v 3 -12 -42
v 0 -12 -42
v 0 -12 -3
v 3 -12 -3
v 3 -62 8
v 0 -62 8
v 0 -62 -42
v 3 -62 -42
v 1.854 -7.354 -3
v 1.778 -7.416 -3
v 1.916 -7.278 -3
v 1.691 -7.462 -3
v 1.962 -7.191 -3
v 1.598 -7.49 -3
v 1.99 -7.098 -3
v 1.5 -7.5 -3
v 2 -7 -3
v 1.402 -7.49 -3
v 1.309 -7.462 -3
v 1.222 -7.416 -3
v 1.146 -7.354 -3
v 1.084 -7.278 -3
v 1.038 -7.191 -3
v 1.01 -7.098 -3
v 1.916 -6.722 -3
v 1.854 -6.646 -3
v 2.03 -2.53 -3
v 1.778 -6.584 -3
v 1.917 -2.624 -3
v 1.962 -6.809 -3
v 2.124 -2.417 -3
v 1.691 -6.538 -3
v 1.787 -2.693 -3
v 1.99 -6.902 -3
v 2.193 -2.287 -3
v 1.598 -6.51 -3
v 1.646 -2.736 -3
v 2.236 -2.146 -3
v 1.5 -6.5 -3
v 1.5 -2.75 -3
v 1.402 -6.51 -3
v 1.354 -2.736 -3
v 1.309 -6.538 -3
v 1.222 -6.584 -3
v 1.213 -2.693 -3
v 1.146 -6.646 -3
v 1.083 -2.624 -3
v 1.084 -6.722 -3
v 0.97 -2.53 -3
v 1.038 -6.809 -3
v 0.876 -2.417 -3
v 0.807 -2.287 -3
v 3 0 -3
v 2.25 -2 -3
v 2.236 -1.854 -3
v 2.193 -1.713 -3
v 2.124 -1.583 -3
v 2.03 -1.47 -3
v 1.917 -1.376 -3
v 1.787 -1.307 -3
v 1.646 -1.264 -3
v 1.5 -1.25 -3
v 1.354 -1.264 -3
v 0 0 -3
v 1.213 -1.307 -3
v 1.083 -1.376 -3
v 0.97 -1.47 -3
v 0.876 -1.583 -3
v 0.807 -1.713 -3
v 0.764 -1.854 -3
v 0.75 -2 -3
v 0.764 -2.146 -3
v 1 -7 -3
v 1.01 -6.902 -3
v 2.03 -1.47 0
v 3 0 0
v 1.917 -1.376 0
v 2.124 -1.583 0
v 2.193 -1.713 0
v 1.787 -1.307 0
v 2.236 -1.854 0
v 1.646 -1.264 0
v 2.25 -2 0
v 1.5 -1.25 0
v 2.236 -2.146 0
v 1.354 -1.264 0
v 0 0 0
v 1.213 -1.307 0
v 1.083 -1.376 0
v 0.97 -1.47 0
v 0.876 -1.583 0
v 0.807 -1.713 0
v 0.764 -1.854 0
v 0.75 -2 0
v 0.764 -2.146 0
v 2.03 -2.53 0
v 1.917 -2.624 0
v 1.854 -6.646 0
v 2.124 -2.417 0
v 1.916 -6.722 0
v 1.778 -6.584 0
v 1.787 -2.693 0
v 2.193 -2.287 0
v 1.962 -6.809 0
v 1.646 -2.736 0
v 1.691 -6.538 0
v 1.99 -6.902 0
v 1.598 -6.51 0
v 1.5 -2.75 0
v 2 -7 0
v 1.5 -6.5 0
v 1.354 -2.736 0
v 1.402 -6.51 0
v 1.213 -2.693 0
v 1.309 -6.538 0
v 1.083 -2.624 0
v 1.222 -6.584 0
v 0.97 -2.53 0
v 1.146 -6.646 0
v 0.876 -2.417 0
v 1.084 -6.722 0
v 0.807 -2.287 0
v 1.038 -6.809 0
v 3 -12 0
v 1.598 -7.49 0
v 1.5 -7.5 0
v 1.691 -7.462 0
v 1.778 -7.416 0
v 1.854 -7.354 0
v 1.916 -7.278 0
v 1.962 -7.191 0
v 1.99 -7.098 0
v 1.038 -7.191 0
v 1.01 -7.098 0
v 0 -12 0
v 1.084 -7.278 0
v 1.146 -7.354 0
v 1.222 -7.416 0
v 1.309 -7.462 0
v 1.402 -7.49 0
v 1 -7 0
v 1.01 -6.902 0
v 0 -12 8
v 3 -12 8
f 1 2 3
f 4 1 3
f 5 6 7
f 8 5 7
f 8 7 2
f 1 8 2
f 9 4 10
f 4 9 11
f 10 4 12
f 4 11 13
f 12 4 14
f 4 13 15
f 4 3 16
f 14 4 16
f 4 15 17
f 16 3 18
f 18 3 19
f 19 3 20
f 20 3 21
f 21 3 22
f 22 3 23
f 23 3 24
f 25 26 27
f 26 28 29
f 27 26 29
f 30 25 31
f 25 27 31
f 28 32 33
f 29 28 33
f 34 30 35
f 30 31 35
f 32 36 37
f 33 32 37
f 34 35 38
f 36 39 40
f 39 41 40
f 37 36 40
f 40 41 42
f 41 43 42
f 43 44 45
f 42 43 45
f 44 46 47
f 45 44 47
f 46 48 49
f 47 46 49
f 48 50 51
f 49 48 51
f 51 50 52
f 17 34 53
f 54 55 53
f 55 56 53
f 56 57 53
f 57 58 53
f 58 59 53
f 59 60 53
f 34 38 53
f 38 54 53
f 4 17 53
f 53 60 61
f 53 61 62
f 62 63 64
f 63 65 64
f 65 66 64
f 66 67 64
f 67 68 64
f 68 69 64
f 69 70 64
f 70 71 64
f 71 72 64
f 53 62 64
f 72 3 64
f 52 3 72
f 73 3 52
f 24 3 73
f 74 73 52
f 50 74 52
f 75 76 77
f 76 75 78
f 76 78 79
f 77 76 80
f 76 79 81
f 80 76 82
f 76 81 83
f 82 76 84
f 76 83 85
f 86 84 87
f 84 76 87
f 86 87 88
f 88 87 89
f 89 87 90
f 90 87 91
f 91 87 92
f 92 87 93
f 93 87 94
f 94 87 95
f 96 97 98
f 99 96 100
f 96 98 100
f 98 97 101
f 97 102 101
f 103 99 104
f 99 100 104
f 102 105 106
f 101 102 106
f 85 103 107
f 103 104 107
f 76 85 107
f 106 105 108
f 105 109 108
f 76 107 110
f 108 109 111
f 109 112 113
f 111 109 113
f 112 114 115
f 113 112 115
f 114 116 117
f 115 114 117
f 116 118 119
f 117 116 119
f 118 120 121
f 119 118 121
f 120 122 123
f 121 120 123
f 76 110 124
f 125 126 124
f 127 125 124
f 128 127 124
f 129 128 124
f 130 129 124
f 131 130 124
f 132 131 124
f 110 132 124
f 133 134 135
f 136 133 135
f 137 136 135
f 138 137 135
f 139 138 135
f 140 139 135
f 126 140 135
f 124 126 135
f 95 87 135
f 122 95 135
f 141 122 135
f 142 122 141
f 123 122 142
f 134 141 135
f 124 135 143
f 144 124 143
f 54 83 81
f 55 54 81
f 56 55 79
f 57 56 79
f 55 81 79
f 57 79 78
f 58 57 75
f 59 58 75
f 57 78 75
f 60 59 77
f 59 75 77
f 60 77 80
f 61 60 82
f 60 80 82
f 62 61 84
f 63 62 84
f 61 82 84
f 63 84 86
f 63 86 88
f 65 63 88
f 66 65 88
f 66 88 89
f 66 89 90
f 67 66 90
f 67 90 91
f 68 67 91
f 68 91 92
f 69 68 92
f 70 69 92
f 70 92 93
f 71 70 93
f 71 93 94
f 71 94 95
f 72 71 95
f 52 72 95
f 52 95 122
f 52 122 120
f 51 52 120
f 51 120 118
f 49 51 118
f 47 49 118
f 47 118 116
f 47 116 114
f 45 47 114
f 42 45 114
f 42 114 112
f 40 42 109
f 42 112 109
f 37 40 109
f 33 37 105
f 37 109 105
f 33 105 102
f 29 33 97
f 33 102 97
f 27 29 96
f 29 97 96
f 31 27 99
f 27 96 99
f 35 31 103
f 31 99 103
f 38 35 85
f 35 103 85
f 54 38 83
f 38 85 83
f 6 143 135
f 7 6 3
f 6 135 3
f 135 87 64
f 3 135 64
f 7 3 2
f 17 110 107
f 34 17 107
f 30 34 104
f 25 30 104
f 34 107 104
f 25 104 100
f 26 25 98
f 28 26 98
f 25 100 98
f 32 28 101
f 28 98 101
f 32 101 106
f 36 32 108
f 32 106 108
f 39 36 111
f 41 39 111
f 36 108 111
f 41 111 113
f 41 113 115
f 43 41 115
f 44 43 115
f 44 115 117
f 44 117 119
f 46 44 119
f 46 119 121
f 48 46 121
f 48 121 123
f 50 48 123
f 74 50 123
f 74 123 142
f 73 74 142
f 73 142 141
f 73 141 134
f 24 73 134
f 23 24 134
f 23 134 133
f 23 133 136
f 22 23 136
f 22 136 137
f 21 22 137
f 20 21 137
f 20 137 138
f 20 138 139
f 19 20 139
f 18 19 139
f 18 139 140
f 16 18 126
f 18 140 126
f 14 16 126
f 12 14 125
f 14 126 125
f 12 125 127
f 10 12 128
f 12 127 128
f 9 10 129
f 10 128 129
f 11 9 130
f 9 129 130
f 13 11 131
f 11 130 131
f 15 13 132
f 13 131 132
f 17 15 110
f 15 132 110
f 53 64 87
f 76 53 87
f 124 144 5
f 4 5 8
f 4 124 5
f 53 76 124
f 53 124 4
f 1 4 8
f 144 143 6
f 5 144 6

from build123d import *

# Parameters (mm, degrees)
BOSS_EXTRUDE1_DEPTH = 3
SKETCH2_R           = 0.75
SKETCH2_R_2         = 0.5
CUT_EXTRUDE1_DEPTH  = 10


with BuildPart() as part:
    # Sketch1 → Boss-Extrude1 (new body)
    with BuildSketch(Plane(origin=(0, 0, 0), x_dir=(0, 0, -1), z_dir=(1, 0, 0))):
        Polygon((0, 0), (0, -12), (-8, -12), (-8, -62), (42, -62), (42, -12), (3, -12), (3, 0), align=None)
    extrude(amount=BOSS_EXTRUDE1_DEPTH)

    # Sketch2 → Cut-Extrude1 (cut)
    with BuildSketch(Plane.XY):
        with Locations((1.5, -2)):
            Circle(SKETCH2_R)
        with Locations((1.5, -7)):
            Circle(SKETCH2_R_2)
    extrude(amount=-CUT_EXTRUDE1_DEPTH, mode=Mode.SUBTRACT)


solid = part.part
